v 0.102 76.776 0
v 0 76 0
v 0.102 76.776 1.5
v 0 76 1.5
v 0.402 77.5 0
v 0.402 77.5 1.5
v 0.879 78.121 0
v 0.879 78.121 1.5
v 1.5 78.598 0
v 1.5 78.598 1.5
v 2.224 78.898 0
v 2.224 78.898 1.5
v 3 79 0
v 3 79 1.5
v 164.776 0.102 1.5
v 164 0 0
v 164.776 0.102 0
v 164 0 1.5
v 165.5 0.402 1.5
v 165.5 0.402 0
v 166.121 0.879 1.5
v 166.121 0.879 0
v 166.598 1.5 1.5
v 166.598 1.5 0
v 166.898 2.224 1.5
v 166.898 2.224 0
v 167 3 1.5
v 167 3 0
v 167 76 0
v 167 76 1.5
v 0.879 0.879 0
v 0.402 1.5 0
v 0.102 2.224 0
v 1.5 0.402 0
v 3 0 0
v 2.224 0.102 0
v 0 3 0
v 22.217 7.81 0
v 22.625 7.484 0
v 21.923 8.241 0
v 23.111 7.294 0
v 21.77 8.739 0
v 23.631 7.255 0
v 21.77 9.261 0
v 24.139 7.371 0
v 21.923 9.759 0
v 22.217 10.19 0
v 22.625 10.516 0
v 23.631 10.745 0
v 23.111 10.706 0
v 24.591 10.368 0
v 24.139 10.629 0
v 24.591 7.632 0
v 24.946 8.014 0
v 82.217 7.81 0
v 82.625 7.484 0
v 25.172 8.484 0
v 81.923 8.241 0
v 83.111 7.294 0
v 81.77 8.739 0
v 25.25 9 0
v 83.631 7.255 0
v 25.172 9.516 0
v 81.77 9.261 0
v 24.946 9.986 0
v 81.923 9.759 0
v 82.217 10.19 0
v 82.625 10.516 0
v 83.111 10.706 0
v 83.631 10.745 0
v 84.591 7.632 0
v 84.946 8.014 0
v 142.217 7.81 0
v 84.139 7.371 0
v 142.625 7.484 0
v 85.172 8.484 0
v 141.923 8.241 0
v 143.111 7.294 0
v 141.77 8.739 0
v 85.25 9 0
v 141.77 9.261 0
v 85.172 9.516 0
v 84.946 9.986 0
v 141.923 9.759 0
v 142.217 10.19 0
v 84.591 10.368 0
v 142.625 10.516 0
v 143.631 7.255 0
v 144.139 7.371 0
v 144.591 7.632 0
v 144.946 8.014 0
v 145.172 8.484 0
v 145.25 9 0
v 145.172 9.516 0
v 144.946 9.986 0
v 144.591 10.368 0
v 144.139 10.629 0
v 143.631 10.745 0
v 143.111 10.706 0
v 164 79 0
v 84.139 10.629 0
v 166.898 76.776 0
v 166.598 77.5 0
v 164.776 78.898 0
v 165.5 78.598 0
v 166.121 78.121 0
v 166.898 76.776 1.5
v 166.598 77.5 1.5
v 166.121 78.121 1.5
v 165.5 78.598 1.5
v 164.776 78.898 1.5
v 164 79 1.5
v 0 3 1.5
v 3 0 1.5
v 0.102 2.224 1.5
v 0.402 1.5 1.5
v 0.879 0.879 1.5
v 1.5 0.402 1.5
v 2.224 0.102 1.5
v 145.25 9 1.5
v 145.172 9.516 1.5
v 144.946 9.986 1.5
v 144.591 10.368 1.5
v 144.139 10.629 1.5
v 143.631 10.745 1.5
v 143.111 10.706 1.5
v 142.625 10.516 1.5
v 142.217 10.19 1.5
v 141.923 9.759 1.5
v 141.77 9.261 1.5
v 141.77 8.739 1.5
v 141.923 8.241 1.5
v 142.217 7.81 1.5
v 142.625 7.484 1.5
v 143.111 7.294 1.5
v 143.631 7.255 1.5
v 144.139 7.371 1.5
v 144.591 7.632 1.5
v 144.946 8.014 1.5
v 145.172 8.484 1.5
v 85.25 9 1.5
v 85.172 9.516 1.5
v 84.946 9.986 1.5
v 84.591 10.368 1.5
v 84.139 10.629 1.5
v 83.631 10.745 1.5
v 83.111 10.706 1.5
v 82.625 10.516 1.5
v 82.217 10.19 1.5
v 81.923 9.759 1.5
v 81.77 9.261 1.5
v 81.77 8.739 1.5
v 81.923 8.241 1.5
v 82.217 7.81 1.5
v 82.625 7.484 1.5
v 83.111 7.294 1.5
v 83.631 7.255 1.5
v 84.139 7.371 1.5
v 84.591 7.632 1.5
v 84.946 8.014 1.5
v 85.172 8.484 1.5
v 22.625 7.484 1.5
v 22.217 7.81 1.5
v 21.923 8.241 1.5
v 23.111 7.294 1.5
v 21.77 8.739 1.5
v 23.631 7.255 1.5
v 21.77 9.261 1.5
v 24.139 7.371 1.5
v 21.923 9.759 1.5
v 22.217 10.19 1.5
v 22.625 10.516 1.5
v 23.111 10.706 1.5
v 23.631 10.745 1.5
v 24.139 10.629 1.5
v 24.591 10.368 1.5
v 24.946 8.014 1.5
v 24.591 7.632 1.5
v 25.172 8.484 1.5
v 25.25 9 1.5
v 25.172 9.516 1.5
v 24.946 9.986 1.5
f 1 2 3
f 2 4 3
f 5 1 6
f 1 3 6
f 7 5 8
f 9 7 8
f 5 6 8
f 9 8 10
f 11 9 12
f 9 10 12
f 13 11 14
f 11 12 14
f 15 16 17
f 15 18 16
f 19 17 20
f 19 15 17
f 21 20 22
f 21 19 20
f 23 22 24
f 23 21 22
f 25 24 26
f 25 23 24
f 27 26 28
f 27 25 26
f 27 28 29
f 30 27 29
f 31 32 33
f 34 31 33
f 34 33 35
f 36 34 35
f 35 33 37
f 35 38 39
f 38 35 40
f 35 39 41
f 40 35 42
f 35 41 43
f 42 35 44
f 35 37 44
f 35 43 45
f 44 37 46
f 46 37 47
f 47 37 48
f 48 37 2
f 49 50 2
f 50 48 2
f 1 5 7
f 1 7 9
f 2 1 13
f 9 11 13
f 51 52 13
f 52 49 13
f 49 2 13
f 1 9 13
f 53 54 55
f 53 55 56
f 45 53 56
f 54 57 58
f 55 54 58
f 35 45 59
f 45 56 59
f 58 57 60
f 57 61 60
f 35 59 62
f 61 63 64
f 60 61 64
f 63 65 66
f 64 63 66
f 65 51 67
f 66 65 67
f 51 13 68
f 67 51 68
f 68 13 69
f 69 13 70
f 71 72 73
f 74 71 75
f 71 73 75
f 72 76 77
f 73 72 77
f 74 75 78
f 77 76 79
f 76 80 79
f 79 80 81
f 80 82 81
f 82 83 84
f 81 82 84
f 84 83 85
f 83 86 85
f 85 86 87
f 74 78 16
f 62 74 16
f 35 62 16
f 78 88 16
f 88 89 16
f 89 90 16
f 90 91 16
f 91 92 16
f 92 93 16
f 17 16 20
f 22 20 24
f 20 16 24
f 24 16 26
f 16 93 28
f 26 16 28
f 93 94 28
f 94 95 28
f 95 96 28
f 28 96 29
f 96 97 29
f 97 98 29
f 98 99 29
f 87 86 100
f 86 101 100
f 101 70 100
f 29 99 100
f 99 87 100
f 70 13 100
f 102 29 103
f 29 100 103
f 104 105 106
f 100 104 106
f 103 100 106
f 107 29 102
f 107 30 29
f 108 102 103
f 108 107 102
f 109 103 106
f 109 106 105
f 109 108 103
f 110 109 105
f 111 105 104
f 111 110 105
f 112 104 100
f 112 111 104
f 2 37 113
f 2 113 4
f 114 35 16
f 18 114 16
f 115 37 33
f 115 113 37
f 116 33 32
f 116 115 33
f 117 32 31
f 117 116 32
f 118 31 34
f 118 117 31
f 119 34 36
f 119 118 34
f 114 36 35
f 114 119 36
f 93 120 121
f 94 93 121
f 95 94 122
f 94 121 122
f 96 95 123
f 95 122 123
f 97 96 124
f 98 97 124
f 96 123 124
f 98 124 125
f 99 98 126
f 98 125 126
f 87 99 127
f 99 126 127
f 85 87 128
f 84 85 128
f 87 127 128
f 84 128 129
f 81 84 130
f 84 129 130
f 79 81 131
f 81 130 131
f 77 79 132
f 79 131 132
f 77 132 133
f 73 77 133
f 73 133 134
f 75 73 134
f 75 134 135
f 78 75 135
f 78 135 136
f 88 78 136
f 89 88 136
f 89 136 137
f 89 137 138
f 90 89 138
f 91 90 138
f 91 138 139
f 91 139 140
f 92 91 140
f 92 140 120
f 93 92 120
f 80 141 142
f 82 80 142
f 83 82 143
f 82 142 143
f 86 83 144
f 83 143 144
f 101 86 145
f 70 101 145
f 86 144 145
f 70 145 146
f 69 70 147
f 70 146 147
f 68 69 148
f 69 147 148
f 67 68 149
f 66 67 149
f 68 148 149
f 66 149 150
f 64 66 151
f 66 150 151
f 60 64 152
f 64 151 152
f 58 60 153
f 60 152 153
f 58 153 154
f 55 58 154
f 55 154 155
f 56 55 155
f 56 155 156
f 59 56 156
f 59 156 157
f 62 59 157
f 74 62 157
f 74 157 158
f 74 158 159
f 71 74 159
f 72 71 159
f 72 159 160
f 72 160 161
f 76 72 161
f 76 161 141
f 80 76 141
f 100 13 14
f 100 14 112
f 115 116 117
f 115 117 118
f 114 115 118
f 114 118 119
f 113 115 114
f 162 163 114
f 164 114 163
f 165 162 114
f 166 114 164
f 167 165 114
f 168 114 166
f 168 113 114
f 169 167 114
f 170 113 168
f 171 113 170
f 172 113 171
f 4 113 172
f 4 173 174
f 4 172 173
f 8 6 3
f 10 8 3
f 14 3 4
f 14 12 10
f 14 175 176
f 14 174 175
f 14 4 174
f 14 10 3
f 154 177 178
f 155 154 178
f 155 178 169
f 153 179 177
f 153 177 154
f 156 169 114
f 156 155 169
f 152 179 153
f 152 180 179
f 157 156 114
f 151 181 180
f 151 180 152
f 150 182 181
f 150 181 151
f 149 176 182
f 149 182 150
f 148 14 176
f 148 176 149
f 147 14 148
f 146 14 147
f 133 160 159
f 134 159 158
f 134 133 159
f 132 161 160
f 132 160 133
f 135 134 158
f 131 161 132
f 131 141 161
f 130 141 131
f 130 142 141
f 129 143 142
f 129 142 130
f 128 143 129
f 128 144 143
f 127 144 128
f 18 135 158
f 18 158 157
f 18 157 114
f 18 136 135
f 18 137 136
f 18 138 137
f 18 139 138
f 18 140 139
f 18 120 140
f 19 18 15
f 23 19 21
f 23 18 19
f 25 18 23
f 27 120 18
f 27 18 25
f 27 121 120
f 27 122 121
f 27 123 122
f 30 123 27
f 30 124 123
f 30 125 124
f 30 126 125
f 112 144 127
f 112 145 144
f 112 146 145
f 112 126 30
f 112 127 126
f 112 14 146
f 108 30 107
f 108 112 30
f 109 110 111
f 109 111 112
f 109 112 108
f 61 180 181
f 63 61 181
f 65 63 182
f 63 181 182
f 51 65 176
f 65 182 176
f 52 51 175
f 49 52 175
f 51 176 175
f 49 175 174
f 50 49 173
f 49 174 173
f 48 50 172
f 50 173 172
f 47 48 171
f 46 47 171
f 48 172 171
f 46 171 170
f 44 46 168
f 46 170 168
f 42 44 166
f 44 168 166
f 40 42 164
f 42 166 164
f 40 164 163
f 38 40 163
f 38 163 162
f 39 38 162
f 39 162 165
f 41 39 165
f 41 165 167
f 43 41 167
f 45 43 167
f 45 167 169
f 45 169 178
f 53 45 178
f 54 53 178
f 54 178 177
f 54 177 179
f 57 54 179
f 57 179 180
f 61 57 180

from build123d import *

# Parameters (mm, degrees)
ESQUISSE1_W                  = 167
ESQUISSE1_H                  = 79
BOSS_EXTRU_1_DEPTH           = 1.5
CONG_1_R                     = 3
ESQUISSE2_R                  = 1.75
ENL_V_MAT_EXTRU_1_DEPTH      = 1
ENL_V_MAT_EXTRU_1_DEPTH_BACK = 2.5


with BuildPart() as part:
    # Esquisse1 → Boss.-Extru.1 (new body)
    with BuildSketch(Plane.XY):
        with Locations((83.5, 39.5)):
            Rectangle(ESQUISSE1_W, ESQUISSE1_H)
    extrude(amount=BOSS_EXTRU_1_DEPTH)

    # Congé1
    cong_1_edges = [part.edges().sort_by_distance(p)[0] for p in [
        (0, 79, 0.75),
        (167, 79, 0.75),
        (167, 0, 0.75),
        (0, 0, 0.75),
    ]]
    fillet(cong_1_edges, radius=CONG_1_R)

    # Esquisse2 → Enlèv. mat.-Extru.1 (cut, two sides)
    with BuildSketch(Plane.XY.offset(1.5)) as enl_v_mat_extru_1_sk:
        with Locations((23.5, 9)):
            Circle(ESQUISSE2_R)
        with Locations((83.5, 9)):
            Circle(ESQUISSE2_R)
        with Locations((143.5, 9)):
            Circle(ESQUISSE2_R)
    extrude(amount=ENL_V_MAT_EXTRU_1_DEPTH, mode=Mode.SUBTRACT)
    extrude(enl_v_mat_extru_1_sk.sketch, amount=-ENL_V_MAT_EXTRU_1_DEPTH_BACK, mode=Mode.SUBTRACT)


solid = part.part
